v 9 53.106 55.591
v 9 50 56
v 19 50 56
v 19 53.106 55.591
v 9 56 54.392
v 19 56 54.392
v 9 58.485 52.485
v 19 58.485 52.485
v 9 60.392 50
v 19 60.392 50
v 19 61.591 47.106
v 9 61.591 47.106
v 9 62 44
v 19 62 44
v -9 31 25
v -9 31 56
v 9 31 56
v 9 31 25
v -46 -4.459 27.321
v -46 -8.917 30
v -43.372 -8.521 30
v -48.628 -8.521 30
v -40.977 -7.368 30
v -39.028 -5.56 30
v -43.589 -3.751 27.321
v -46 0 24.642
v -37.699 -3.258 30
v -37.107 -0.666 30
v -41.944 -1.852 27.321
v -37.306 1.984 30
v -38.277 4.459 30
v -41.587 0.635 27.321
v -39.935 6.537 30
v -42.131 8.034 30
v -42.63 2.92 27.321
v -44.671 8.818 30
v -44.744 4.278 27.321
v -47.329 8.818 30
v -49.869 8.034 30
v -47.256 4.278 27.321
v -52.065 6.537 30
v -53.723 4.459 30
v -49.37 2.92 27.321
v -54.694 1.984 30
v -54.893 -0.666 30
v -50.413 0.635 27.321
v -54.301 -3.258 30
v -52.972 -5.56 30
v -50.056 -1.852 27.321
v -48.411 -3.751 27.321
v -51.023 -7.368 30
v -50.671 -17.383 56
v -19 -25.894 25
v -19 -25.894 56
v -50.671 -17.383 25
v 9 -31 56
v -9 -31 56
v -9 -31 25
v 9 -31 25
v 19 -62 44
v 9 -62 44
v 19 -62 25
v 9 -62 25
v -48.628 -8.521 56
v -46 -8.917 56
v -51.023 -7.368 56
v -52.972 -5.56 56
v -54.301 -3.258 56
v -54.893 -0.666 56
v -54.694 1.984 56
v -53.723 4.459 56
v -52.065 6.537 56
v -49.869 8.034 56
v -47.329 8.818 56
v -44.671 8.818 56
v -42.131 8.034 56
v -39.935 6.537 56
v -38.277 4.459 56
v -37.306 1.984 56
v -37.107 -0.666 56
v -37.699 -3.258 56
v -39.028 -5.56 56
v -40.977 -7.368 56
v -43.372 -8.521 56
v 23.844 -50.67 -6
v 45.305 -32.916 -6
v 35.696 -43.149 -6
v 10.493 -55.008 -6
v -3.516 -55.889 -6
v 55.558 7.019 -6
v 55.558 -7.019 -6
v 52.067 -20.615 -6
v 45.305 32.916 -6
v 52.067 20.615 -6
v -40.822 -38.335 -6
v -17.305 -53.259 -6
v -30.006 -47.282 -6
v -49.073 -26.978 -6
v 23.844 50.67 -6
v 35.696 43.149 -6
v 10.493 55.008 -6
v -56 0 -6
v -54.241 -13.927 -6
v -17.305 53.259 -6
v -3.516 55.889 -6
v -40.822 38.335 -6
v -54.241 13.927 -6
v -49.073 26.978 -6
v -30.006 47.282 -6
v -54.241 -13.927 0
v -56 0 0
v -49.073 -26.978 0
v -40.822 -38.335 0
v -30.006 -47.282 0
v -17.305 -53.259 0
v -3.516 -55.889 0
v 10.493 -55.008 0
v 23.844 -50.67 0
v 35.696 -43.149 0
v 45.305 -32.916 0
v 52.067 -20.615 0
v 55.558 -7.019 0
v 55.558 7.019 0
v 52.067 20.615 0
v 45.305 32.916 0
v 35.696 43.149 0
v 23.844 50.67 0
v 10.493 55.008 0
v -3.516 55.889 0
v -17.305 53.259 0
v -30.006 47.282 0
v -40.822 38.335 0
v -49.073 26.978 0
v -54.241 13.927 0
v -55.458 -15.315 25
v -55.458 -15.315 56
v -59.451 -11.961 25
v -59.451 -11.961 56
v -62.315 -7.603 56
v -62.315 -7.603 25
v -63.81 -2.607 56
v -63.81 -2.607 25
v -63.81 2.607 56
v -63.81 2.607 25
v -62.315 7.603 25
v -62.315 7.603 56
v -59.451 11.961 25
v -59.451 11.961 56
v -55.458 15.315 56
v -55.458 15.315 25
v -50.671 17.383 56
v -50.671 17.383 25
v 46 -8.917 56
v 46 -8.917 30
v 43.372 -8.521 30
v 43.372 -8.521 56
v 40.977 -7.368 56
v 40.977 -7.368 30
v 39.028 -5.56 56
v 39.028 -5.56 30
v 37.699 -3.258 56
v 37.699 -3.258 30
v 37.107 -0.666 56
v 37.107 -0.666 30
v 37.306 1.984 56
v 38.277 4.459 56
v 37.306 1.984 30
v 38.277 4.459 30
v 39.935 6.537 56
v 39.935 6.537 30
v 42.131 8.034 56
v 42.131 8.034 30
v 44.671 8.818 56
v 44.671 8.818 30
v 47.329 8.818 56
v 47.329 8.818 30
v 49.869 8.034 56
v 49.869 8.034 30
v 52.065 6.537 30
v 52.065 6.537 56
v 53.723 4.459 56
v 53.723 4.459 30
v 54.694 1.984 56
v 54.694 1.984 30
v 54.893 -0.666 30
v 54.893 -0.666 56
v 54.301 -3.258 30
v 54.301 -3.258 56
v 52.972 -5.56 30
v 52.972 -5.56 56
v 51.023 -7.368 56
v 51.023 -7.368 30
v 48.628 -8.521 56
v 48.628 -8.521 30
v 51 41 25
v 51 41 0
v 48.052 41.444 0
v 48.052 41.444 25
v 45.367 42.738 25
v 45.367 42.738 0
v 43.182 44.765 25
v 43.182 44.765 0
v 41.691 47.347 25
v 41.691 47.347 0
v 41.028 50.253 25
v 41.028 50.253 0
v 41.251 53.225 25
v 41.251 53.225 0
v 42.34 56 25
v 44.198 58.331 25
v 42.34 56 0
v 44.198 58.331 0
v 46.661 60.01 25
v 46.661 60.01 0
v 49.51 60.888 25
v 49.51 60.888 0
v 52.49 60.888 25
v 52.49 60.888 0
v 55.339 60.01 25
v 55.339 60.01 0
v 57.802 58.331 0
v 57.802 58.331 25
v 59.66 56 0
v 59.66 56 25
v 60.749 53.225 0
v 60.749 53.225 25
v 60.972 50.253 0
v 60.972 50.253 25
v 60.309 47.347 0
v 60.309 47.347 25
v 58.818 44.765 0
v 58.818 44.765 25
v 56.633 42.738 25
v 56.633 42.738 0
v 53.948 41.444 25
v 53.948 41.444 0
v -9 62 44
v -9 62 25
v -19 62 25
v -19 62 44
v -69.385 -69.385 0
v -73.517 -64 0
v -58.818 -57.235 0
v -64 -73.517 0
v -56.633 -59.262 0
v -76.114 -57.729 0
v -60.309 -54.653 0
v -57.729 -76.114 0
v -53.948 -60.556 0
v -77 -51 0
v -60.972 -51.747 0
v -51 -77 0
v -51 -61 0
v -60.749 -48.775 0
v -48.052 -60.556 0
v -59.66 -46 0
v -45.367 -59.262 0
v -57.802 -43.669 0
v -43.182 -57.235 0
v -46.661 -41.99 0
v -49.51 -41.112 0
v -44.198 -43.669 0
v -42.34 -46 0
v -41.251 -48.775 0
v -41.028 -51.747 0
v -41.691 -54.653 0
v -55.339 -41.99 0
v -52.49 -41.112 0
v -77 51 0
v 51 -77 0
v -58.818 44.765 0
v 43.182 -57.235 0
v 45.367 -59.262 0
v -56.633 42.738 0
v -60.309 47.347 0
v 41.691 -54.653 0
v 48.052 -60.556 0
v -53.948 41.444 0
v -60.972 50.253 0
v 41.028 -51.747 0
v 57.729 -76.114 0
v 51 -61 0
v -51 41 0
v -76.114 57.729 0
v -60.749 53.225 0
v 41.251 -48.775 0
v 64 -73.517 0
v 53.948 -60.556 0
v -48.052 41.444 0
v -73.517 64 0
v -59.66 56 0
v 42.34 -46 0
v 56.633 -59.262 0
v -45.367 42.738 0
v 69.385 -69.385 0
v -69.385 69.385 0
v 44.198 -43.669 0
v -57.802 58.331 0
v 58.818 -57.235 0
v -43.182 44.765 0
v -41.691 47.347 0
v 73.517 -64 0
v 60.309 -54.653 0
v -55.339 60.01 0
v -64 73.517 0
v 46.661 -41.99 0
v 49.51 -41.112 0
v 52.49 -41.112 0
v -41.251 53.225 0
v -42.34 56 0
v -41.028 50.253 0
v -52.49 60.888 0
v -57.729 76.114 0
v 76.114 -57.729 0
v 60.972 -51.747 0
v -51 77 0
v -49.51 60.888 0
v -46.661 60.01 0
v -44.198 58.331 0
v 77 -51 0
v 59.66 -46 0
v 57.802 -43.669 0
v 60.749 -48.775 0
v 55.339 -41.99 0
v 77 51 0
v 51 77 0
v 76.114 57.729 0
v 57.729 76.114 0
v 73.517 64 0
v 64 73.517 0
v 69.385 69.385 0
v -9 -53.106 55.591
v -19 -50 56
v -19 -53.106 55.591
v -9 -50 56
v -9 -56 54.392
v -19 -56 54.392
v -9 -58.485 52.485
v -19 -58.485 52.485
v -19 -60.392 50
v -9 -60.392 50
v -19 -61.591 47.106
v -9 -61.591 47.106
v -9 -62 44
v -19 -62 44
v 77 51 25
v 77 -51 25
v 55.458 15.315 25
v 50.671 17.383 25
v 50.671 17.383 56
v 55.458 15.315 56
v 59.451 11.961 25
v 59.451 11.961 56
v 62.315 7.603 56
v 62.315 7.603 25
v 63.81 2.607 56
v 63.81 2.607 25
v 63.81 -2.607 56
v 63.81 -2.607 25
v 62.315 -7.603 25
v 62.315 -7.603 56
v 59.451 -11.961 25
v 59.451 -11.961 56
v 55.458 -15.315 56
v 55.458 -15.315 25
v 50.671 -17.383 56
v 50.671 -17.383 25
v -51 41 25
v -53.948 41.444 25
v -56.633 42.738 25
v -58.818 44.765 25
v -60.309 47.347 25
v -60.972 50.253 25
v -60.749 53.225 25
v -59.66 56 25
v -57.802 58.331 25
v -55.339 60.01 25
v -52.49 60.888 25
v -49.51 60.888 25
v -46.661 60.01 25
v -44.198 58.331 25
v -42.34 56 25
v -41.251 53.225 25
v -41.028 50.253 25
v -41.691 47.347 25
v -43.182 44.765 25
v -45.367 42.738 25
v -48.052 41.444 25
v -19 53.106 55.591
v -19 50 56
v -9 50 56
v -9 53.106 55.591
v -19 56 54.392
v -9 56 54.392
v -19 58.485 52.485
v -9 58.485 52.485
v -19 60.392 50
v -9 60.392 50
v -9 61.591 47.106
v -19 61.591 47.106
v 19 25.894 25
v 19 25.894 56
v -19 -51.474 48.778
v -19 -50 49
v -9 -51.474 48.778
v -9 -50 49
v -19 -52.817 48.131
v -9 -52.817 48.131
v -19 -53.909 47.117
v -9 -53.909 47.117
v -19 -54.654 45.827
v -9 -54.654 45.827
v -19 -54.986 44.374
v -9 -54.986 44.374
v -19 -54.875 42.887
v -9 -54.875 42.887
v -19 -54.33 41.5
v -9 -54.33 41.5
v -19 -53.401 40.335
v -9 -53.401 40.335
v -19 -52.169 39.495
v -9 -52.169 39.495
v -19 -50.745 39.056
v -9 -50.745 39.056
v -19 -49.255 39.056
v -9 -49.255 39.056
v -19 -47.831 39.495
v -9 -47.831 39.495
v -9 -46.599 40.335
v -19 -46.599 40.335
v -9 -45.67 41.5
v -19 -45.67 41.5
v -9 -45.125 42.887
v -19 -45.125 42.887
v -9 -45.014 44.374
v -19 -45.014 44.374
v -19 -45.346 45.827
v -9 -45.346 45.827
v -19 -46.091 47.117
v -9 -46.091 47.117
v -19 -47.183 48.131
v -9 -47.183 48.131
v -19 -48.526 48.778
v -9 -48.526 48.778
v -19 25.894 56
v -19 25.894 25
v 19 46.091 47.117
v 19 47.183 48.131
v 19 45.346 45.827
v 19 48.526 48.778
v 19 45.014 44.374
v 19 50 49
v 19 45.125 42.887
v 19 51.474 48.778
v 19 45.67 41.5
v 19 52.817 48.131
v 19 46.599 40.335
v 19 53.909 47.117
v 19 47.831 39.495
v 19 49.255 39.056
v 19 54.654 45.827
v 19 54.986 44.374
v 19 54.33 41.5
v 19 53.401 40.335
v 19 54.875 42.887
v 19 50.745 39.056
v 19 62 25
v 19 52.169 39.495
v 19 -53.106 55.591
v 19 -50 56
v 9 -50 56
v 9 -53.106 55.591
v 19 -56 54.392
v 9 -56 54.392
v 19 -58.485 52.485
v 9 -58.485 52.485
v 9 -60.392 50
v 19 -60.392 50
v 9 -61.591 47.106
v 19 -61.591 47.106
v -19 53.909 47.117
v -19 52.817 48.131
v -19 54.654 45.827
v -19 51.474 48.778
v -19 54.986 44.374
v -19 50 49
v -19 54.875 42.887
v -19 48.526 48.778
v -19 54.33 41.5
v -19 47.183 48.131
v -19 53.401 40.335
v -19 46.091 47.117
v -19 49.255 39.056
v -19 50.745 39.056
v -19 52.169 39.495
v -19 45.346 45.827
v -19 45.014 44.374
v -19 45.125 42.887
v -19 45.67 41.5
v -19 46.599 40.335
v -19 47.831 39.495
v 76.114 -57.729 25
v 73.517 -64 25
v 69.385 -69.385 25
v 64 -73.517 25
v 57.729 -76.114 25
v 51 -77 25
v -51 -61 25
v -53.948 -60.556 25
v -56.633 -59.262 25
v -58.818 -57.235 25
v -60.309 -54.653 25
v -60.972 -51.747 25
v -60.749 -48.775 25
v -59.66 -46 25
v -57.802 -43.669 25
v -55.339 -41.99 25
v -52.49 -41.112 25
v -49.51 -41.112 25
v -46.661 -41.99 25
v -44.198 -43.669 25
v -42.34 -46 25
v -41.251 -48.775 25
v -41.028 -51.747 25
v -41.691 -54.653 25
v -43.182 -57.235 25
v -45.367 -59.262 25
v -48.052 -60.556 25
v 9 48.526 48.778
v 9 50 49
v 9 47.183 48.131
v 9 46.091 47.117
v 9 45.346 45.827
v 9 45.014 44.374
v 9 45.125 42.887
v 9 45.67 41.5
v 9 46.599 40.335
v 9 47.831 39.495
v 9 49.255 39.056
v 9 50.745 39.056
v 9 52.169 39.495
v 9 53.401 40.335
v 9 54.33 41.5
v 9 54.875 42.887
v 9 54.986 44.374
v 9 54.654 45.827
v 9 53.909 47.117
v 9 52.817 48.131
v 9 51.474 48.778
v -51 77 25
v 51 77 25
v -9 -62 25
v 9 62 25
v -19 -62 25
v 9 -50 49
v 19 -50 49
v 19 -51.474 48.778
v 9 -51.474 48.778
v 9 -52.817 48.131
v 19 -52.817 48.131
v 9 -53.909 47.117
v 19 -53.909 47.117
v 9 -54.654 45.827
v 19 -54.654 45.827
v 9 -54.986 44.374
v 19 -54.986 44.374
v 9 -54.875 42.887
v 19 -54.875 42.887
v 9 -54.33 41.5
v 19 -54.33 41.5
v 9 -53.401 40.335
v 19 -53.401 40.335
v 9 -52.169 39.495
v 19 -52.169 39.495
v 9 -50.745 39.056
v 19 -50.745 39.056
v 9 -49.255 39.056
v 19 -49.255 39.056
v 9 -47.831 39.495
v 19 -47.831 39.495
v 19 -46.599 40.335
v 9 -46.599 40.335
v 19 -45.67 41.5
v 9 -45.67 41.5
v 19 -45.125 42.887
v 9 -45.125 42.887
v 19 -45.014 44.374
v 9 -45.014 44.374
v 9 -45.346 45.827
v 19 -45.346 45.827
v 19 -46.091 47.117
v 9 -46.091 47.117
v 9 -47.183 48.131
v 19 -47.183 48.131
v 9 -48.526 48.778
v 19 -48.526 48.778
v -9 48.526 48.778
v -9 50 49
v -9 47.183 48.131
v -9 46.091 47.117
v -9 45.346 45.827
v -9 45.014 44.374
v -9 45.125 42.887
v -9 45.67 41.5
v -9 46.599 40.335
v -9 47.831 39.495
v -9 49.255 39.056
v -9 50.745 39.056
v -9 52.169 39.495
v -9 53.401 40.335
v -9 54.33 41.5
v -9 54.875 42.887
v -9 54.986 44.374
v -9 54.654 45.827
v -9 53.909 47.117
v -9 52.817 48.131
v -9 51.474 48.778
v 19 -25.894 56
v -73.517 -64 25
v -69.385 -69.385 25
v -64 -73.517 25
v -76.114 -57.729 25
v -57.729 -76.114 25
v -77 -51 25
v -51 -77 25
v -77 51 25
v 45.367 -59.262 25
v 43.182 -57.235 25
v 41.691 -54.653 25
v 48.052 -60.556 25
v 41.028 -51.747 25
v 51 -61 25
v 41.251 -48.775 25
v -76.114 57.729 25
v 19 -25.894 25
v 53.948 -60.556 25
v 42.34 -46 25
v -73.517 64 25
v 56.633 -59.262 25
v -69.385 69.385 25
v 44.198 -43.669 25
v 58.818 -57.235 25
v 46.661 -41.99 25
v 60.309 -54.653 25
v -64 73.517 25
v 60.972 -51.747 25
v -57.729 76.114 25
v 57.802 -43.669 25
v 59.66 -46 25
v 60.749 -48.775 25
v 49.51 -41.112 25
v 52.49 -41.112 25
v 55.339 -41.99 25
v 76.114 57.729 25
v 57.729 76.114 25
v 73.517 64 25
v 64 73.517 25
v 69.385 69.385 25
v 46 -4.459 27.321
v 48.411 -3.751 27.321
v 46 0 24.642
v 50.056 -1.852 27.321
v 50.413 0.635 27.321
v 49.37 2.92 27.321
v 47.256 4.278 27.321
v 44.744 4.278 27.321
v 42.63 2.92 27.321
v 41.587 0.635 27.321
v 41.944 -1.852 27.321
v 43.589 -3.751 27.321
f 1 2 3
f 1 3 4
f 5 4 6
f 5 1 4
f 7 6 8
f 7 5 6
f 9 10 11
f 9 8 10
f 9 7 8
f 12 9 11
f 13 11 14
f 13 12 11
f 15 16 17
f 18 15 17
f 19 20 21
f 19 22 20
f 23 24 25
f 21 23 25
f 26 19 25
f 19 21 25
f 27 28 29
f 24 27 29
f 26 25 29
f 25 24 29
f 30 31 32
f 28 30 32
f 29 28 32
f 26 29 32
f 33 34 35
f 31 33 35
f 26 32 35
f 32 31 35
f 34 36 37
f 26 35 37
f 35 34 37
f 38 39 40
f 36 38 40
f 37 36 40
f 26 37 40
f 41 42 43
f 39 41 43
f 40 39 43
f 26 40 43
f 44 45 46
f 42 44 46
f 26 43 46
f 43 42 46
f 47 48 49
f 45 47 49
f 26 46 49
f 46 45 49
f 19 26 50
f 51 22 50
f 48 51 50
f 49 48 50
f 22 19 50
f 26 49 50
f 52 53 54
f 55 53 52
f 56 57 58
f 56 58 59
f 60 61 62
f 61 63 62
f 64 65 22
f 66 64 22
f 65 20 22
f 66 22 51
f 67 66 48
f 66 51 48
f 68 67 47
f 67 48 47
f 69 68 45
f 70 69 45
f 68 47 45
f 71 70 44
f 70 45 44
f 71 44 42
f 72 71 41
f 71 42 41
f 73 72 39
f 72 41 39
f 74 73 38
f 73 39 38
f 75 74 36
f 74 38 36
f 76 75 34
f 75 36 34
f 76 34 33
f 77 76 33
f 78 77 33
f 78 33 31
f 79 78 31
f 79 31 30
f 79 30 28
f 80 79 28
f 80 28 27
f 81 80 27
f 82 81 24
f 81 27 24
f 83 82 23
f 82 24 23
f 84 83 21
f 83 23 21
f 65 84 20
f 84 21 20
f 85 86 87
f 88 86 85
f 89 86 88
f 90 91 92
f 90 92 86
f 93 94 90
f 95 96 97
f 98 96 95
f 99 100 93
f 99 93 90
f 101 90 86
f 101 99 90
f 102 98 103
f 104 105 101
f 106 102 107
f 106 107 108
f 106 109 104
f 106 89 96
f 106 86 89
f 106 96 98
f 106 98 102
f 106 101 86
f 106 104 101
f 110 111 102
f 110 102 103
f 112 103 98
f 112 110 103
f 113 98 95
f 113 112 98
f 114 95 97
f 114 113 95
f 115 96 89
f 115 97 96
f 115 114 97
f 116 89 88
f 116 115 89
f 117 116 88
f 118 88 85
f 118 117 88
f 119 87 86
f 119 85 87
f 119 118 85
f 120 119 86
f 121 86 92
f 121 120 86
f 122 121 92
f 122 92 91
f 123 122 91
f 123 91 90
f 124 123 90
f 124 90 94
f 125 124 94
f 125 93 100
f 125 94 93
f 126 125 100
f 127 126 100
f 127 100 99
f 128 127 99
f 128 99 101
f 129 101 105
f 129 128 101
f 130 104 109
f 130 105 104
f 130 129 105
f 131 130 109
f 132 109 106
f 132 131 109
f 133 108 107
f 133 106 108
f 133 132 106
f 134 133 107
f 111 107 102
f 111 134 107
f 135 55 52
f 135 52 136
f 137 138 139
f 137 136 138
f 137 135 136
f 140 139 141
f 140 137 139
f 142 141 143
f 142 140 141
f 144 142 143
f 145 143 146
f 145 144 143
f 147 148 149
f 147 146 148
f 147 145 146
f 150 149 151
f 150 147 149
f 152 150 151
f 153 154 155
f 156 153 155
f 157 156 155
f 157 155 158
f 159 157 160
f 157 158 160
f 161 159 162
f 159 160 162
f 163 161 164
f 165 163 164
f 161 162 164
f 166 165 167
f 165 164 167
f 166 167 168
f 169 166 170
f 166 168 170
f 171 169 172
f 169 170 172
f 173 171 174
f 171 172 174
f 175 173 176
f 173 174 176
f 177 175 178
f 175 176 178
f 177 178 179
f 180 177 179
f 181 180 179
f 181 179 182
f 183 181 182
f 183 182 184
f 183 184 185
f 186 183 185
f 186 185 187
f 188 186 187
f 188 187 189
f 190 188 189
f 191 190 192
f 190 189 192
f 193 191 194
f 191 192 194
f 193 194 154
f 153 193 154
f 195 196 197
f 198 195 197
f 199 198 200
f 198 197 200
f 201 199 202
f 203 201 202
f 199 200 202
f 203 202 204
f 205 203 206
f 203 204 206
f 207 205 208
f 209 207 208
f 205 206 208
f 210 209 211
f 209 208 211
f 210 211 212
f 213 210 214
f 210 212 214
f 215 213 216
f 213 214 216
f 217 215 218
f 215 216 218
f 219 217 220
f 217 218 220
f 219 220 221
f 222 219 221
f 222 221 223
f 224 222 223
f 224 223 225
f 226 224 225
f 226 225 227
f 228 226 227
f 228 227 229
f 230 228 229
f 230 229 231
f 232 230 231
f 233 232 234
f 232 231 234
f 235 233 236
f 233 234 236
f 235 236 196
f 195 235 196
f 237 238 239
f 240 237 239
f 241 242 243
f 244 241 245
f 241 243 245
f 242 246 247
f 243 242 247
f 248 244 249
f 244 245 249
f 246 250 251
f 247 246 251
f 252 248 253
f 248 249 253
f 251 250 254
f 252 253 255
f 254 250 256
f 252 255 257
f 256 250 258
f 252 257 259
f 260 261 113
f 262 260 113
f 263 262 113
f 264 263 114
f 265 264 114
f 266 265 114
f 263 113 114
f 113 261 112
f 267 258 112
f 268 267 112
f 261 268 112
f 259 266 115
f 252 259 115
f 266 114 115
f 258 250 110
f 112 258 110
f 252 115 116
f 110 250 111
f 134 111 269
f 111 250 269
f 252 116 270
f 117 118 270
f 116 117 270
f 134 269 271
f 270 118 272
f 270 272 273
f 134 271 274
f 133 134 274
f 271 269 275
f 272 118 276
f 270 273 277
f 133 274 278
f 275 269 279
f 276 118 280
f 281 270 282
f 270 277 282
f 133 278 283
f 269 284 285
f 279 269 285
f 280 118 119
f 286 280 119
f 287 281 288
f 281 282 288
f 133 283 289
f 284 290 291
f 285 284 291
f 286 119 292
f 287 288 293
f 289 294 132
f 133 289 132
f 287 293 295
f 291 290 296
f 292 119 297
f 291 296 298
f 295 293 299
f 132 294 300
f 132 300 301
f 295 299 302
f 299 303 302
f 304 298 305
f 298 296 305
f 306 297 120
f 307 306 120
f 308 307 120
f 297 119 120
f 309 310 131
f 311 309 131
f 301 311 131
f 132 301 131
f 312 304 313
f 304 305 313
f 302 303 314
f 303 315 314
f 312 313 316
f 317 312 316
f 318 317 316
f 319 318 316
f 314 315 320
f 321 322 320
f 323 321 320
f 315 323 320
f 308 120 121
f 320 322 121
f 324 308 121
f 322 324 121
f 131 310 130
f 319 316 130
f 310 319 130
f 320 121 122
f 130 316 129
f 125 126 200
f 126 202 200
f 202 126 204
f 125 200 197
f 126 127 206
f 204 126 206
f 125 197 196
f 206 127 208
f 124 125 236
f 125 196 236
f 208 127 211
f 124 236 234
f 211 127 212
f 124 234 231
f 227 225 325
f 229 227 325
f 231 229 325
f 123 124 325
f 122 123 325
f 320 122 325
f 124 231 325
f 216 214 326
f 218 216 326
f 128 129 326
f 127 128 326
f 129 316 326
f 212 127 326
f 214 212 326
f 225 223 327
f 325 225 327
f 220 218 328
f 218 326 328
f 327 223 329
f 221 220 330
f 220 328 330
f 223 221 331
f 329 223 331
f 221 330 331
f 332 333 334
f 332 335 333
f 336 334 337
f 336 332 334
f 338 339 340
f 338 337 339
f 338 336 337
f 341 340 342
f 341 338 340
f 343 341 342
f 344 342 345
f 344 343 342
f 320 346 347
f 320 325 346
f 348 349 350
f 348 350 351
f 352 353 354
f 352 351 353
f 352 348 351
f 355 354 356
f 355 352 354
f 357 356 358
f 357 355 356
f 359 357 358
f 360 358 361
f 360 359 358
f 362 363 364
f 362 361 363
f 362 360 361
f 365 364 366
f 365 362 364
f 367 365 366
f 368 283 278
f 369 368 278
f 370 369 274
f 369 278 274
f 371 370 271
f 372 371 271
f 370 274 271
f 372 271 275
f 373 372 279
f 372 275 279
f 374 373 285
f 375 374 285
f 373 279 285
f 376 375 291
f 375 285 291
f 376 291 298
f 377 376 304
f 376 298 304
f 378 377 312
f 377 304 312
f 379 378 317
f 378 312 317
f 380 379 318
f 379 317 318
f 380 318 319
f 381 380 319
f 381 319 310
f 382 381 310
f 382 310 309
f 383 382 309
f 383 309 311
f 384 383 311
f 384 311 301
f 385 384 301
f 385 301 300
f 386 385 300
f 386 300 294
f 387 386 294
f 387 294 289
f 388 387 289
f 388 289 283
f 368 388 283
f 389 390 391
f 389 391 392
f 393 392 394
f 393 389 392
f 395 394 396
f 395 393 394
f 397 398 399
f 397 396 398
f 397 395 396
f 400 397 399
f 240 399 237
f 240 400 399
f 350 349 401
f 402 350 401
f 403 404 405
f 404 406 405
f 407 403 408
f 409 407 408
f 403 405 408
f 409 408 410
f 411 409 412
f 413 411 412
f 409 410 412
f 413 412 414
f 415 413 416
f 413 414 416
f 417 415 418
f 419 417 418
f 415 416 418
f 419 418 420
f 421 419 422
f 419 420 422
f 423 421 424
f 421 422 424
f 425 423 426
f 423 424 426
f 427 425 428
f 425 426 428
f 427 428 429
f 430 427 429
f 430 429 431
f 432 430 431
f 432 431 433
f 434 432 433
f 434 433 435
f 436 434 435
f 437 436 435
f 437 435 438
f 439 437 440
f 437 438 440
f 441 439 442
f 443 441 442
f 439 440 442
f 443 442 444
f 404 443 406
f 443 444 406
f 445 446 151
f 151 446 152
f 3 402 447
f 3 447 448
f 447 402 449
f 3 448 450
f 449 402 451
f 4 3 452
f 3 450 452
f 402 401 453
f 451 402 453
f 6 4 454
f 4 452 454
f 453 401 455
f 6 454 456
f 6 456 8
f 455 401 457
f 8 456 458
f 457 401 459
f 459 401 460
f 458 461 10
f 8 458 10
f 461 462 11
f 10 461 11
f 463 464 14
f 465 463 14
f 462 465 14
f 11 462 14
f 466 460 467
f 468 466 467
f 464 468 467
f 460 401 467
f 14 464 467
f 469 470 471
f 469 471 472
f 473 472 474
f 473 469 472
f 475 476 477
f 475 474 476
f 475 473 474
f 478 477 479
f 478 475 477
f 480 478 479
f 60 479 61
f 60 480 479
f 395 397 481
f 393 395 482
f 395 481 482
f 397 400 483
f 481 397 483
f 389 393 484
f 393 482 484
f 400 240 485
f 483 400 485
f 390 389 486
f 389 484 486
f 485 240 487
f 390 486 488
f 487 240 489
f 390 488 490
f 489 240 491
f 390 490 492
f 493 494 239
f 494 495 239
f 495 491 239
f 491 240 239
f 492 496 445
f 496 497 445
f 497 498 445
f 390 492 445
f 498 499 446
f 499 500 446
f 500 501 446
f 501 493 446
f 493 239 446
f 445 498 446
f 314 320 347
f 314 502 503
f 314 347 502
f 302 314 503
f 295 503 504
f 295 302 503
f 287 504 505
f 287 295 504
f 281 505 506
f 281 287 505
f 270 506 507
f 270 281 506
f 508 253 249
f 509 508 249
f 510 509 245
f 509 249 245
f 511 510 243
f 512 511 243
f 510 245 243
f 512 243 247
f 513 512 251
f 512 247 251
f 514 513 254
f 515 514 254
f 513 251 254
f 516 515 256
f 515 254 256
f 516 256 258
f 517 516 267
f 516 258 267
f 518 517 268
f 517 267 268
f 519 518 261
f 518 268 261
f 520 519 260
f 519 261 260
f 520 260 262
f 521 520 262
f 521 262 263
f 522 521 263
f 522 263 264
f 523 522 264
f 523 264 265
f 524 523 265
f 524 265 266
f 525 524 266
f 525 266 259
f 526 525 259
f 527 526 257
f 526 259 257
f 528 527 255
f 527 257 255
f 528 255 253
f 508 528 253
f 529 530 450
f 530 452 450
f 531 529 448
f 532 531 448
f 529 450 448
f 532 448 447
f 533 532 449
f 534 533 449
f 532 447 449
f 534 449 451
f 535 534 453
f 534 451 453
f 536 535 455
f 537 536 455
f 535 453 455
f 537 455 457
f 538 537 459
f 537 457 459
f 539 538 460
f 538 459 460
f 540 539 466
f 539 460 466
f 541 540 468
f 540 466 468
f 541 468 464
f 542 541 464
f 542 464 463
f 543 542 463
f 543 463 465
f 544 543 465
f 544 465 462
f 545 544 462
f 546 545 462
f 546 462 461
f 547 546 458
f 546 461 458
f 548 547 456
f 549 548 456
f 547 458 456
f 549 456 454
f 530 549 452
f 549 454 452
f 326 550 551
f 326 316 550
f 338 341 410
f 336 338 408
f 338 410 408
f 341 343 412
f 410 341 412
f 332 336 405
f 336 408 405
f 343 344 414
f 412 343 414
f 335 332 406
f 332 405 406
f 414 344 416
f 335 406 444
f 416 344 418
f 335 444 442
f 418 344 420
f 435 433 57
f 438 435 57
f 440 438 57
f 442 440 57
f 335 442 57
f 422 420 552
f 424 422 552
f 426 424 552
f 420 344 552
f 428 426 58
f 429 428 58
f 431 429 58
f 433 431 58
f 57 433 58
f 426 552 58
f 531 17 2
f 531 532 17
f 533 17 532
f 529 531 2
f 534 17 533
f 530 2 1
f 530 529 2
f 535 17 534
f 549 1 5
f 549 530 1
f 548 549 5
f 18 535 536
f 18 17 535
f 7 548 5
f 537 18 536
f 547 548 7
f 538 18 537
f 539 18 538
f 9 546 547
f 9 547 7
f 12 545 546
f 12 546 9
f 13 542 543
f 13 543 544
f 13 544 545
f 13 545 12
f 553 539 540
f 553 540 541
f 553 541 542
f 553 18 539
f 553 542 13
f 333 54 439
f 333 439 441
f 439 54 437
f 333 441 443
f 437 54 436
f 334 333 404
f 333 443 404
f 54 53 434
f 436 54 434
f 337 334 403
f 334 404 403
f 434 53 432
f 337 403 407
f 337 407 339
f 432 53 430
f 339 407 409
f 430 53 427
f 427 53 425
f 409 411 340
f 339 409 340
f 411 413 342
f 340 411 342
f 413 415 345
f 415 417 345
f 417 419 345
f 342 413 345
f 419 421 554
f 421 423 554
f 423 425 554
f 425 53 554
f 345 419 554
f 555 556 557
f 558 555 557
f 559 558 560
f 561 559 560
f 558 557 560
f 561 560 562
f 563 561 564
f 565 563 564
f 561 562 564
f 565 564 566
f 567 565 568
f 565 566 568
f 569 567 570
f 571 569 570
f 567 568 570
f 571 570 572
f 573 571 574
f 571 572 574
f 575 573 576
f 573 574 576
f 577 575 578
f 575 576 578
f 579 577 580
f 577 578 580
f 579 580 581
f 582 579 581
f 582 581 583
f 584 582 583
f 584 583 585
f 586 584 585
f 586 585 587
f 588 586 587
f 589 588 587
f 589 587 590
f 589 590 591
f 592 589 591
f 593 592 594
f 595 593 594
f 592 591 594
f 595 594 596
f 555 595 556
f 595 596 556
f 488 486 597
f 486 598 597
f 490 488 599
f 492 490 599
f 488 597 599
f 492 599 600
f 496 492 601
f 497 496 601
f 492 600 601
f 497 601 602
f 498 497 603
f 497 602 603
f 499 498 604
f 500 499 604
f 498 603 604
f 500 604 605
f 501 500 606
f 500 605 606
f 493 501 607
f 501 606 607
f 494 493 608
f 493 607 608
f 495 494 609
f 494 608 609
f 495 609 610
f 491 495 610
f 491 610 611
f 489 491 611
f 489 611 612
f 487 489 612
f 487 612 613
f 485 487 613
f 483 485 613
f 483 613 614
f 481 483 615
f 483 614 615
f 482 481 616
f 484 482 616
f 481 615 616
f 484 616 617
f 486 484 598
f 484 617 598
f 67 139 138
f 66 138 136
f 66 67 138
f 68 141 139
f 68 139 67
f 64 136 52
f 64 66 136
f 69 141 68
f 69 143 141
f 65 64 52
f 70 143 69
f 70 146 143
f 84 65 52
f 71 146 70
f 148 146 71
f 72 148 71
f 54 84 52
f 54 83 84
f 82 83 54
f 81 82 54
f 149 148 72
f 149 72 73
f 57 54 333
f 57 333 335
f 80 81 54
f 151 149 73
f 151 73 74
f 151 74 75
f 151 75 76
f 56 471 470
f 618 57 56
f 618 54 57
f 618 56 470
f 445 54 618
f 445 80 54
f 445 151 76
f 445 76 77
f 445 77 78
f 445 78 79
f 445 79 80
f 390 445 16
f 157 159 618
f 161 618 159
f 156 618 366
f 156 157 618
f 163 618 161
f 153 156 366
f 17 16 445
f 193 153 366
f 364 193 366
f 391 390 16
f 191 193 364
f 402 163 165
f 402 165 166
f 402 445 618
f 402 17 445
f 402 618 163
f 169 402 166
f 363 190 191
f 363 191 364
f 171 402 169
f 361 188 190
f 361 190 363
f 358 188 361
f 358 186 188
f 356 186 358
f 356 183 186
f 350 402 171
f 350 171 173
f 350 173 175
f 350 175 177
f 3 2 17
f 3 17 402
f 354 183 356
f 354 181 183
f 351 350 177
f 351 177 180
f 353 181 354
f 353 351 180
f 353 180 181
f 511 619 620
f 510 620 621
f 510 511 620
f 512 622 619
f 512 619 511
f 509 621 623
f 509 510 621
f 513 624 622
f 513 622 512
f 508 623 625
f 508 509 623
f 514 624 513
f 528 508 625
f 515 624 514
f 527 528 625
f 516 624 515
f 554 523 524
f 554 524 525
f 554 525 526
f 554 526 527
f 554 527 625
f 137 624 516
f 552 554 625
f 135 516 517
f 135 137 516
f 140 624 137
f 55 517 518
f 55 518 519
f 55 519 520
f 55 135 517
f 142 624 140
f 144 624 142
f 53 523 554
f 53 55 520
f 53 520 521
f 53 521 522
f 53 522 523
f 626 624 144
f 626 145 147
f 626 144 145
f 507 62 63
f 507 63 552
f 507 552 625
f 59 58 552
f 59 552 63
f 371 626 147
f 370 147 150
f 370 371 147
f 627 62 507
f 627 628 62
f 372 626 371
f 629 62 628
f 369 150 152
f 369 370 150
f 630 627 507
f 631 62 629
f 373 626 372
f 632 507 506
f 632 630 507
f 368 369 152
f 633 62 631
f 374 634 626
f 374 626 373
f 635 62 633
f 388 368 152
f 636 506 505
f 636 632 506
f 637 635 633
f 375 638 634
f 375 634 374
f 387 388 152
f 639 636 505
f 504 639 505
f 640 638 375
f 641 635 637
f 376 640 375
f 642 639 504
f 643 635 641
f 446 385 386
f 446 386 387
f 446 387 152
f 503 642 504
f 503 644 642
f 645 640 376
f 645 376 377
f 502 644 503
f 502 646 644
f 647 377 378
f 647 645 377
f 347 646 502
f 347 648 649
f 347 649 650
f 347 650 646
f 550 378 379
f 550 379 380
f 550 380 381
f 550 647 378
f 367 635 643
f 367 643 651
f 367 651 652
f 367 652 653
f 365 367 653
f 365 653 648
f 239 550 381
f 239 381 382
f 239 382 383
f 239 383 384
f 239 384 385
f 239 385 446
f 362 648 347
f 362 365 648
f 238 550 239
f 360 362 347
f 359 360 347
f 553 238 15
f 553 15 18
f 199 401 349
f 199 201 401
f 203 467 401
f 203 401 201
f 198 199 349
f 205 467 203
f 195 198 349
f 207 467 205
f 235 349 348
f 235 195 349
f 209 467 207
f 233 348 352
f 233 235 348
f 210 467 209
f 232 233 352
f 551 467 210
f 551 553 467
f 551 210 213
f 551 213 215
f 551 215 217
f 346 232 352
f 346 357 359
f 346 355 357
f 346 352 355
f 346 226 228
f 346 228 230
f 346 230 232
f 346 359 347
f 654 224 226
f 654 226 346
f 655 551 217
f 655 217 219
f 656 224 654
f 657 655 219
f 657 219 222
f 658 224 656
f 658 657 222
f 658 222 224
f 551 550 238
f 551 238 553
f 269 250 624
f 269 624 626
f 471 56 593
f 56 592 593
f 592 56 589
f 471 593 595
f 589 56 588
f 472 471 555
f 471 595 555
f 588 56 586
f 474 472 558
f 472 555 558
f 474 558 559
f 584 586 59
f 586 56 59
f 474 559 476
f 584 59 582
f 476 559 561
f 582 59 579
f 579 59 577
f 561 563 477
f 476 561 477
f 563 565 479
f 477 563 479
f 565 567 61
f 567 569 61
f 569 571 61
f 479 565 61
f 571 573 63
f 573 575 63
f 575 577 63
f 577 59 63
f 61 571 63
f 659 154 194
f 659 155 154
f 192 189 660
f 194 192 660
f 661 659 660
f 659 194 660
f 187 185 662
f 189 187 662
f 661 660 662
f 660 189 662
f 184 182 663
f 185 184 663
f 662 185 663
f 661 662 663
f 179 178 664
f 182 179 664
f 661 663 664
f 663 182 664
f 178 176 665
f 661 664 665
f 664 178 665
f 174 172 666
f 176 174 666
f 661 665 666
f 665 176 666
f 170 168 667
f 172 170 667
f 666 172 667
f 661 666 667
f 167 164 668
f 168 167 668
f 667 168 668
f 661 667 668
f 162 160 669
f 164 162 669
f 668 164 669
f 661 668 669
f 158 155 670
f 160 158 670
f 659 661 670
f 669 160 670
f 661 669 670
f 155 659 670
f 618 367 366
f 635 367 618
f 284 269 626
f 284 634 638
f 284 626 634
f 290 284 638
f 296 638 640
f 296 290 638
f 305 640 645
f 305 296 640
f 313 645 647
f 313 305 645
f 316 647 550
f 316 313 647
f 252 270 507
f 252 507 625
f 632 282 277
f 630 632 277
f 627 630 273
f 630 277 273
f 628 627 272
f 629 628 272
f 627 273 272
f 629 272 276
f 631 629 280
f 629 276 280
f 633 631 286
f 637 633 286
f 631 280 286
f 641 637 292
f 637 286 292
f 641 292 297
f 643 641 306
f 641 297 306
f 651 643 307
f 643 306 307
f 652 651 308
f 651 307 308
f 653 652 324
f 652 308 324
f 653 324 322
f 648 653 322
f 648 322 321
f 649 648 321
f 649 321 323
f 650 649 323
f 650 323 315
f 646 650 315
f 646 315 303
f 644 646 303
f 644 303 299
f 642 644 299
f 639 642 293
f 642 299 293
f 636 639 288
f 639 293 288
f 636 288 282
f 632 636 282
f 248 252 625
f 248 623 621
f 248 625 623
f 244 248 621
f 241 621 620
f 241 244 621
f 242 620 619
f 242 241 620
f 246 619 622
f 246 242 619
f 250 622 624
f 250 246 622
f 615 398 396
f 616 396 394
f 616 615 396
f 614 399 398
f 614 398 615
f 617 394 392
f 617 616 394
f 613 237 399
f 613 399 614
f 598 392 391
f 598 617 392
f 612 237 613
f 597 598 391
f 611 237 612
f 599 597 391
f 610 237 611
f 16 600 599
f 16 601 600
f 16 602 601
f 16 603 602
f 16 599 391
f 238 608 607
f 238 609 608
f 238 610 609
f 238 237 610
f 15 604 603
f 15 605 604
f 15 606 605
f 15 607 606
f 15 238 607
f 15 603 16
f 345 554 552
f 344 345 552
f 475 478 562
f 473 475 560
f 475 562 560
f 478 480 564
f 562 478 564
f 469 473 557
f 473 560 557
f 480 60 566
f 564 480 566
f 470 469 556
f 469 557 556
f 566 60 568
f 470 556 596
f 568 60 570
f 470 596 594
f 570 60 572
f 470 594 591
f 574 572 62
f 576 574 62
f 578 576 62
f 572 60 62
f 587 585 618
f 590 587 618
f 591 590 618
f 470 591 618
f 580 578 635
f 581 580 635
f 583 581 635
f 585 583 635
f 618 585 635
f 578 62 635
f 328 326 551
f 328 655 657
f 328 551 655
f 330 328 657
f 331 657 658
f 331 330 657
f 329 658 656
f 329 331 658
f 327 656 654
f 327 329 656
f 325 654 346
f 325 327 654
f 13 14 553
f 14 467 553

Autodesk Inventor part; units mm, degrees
ref_plane "YZ Plane" through (0, 0, 0) normal (1, 0, 0) x (0, 1, 0)
ref_plane "XZ Plane" through (0, 0, 0) normal (0, 1, 0) x (-1, 0, 0)
ref_plane "XY Plane" through (0, 0, 0) normal (0, 0, 1) x (1, 0, 0)
sketch "Sketch1" plane through (0, 0, 0) normal (0, 0, 1) x (1, 0, 0)
  line L0 (-51, 77) -> (51, 77)
  line L1 (77, 51) -> (77, -51)
  line L2 (51, -77) -> (-51, -77)
  line L3 (-77, -51) -> (-77, 51)
  line L4 (-77, 77) -> (77, -77) construction
  line L5 (77, 77) -> (-77, -77) construction
  arc A0 (-51, 77) -> (-77, 51) centre (-51, 51) ccw
  arc A1 (-77, -51) -> (-51, -77) centre (-51, -51) ccw
  arc A2 (51, -77) -> (77, -51) centre (51, -51) ccw
  arc A3 (77, 51) -> (51, 77) centre (51, 51) ccw
  point P0 (0, 0)
  dimension "d0" = 154
  dimension "d1" = 154
  dimension "d2" = 26
extrude "Extrusion1" add sketch "Sketch1" along normal blind 25
sketch "Sketch2" plane through (0, 0, 25) normal (0, 0, 1) x (1, 0, 0)
  arc A0 (-77, -51) -> (-51, -77) centre (-51, -51) ccw projected
  arc A1 (51, -77) -> (77, -51) centre (51, -51) ccw projected
  arc A2 (77, 51) -> (51, 77) centre (51, 51) ccw projected
  arc A3 (-51, 77) -> (-77, 51) centre (-51, 51) ccw projected
  point P0 (0, 0)
hole "Hole1" at (-51, -51, 25) at (51, -51, 25) at (51, 51, 25) at (-51, 51, 25) direction (0, 0, -1) diameter 20 end through all
sketch "Sketch3" plane through (0, 0, 0) normal (0, 0, -1) x (-1, 0, 0)
  circle A0 centre (0, 0) radius 56
  dimension "d12" = 112
extrude "Extrusion2" add sketch "Sketch3" along normal blind 6
sketch "Sketch4" plane through (0, 0, 25) normal (0, 0, 1) x (1, 0, 0)
  line L0 (51, 77) -> (-51, 77) projected
sketch "Sketch5" plane through (0, 0, 25) normal (0, 0, 1) x (1, 0, 0)
  arc A0 (50.6713, -17.3833) -> (50.6713, 17.3833) centre (46, 0) ccw
  arc A1 (-50.6713, 17.3833) -> (-50.6713, -17.3833) centre (-46, 0) ccw
  line L0 (0, 31) -> (0, -31) construction
  line L1 (19, 62) -> (-19, -62) construction
  line L2 (-19, 62) -> (19, -62) construction
  line L3 (-9, 62) -> (-9, 31)
  line L4 (-9, 31) -> (9, 31)
  line L5 (9, 31) -> (9, 62)
  line L6 (-9, -62) -> (-9, -31)
  line L7 (-9, -31) -> (9, -31)
  line L8 (9, -31) -> (9, -62)
  line L9 (19, 62) -> (9, 62)
  line L10 (-9, 62) -> (-19, 62)
  line L11 (-19, -62) -> (-9, -62)
  line L12 (9, -62) -> (19, -62)
  line L13 (19, -62) -> (19, -25.8942)
  line L14 (19, 25.8942) -> (19, 62)
  line L15 (-19, 62) -> (-19, 25.8942)
  line L16 (-19, -25.8942) -> (-19, -62)
  line L17 (-19, 25.8942) -> (-50.6713, 17.3833)
  line L18 (-19, -25.8942) -> (-50.6713, -17.3833)
  line L19 (50.6713, -17.3833) -> (19, -25.8942)
  line L20 (50.6713, 17.3833) -> (19, 25.8942)
  point P0 (0, 0)
  dimension "d34" = 36
  dimension "d35" = 36
  dimension "d36" = 92
  dimension "d37" = 46
  dimension "d38" = 62
  dimension "d41" = 38
  dimension "d42" = 124
  dimension "d43" = 18
  dimension "d44" = 31
  dimension "d46" = 18
  dimension "d47" = 31
extrude "Extrusion3" add sketch "Sketch5" along normal blind 31
sketch "Sketch6" plane through (0, 0, 56) normal (0, 0, 1) x (1, 0, 0)
  arc A0 (-50.6713, 17.3833) -> (-50.6713, -17.3833) centre (-46, 0) ccw projected
  arc A1 (50.6713, -17.3833) -> (50.6713, 17.3833) centre (46, 0) ccw projected
  point P0 (0, 0)
hole "Hole2" at (-46, 0, 56) at (46, 0, 56) direction (0, 0, -1) diameter 17.8349 depth 26 tip angle 118 thread size "M20x2" class "6H" standard "ISO Metric profile"
fillet "Fillet1" radius 12 4 edges at (-14, -62, 56) (14, -62, 56) (14, 62, 56) (-14, 62, 56)
sketch "Sketch7" plane through (-19, -62, 25) normal (-1, 0, 0) x (0, 0, 1)
  arc A0 (19, 0) -> (31, 12) centre (19, 12) ccw projected
  arc A1 (31, 112) -> (19, 124) centre (19, 112) ccw projected
  point P0 (-25, 62)
hole "Hole3" at (-19, -50, 44) at (-19, 50, 44) direction (1, 0, 0) diameter 10 end through all
equation "\"d37\" = 0.5 * d36"
properties part number "cad@74"
